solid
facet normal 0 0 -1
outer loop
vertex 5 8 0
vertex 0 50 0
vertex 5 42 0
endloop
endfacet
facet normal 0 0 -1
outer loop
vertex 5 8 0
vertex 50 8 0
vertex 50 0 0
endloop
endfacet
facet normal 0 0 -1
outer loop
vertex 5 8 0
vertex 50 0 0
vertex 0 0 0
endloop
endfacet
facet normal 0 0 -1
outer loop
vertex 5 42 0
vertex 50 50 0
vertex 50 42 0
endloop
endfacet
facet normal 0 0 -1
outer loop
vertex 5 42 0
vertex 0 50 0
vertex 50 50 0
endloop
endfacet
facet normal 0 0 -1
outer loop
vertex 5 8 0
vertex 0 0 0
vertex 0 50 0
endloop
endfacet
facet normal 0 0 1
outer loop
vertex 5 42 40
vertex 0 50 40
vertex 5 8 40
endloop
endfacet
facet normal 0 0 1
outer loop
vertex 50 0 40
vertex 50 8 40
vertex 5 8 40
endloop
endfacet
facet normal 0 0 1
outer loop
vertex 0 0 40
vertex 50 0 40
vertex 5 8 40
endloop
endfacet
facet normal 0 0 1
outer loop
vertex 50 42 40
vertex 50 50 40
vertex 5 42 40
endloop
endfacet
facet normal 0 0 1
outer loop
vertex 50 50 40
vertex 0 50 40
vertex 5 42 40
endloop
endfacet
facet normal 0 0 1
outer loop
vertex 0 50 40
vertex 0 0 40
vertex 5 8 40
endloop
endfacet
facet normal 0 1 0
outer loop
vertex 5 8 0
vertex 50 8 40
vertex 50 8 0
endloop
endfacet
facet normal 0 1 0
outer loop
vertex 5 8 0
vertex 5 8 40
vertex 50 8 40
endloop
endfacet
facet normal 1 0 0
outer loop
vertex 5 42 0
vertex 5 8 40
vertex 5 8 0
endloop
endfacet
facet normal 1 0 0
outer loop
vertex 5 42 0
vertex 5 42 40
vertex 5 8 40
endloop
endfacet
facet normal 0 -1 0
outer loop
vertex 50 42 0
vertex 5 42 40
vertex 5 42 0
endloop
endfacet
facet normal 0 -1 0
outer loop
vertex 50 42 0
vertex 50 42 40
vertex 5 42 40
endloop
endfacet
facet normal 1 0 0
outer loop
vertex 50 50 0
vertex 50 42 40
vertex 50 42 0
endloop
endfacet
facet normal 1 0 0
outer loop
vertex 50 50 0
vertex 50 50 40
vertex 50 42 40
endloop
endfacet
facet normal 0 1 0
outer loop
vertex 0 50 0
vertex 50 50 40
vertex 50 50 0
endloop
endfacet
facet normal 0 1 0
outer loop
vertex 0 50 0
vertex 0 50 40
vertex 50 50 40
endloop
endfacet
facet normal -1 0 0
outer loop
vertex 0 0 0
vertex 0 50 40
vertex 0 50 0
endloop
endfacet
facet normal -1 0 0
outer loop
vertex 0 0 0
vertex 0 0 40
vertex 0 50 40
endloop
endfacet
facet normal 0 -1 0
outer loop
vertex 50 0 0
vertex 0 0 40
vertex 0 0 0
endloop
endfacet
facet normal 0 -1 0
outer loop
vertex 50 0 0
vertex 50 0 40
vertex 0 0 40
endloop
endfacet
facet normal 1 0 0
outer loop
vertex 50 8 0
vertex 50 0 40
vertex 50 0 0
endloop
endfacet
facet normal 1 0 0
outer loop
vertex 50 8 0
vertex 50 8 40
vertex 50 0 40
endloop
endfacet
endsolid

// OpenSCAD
$fn = 32;

// ----------------------------------------------------------------------
// Structural section: channel 50 x 50 mm
// ----------------------------------------------------------------------

// --- parameters (mm) ---
sec_w = 50;               // channel width, X
sec_h = 50;               // channel height, Y
flange_t = 8;             // flange thickness
web_t = 5;                // web thickness
plate_t = 40;             // cut length, Z (extrusion height)

profile = [[0, 0], [50, 0], [50, 8], [5, 8], [5, 42], [50, 42], [50, 50], [0, 50]];  // primary outline, 8 points, counter clockwise

// --- the one profile operation ---
linear_extrude(height = plate_t) polygon(points = profile);
